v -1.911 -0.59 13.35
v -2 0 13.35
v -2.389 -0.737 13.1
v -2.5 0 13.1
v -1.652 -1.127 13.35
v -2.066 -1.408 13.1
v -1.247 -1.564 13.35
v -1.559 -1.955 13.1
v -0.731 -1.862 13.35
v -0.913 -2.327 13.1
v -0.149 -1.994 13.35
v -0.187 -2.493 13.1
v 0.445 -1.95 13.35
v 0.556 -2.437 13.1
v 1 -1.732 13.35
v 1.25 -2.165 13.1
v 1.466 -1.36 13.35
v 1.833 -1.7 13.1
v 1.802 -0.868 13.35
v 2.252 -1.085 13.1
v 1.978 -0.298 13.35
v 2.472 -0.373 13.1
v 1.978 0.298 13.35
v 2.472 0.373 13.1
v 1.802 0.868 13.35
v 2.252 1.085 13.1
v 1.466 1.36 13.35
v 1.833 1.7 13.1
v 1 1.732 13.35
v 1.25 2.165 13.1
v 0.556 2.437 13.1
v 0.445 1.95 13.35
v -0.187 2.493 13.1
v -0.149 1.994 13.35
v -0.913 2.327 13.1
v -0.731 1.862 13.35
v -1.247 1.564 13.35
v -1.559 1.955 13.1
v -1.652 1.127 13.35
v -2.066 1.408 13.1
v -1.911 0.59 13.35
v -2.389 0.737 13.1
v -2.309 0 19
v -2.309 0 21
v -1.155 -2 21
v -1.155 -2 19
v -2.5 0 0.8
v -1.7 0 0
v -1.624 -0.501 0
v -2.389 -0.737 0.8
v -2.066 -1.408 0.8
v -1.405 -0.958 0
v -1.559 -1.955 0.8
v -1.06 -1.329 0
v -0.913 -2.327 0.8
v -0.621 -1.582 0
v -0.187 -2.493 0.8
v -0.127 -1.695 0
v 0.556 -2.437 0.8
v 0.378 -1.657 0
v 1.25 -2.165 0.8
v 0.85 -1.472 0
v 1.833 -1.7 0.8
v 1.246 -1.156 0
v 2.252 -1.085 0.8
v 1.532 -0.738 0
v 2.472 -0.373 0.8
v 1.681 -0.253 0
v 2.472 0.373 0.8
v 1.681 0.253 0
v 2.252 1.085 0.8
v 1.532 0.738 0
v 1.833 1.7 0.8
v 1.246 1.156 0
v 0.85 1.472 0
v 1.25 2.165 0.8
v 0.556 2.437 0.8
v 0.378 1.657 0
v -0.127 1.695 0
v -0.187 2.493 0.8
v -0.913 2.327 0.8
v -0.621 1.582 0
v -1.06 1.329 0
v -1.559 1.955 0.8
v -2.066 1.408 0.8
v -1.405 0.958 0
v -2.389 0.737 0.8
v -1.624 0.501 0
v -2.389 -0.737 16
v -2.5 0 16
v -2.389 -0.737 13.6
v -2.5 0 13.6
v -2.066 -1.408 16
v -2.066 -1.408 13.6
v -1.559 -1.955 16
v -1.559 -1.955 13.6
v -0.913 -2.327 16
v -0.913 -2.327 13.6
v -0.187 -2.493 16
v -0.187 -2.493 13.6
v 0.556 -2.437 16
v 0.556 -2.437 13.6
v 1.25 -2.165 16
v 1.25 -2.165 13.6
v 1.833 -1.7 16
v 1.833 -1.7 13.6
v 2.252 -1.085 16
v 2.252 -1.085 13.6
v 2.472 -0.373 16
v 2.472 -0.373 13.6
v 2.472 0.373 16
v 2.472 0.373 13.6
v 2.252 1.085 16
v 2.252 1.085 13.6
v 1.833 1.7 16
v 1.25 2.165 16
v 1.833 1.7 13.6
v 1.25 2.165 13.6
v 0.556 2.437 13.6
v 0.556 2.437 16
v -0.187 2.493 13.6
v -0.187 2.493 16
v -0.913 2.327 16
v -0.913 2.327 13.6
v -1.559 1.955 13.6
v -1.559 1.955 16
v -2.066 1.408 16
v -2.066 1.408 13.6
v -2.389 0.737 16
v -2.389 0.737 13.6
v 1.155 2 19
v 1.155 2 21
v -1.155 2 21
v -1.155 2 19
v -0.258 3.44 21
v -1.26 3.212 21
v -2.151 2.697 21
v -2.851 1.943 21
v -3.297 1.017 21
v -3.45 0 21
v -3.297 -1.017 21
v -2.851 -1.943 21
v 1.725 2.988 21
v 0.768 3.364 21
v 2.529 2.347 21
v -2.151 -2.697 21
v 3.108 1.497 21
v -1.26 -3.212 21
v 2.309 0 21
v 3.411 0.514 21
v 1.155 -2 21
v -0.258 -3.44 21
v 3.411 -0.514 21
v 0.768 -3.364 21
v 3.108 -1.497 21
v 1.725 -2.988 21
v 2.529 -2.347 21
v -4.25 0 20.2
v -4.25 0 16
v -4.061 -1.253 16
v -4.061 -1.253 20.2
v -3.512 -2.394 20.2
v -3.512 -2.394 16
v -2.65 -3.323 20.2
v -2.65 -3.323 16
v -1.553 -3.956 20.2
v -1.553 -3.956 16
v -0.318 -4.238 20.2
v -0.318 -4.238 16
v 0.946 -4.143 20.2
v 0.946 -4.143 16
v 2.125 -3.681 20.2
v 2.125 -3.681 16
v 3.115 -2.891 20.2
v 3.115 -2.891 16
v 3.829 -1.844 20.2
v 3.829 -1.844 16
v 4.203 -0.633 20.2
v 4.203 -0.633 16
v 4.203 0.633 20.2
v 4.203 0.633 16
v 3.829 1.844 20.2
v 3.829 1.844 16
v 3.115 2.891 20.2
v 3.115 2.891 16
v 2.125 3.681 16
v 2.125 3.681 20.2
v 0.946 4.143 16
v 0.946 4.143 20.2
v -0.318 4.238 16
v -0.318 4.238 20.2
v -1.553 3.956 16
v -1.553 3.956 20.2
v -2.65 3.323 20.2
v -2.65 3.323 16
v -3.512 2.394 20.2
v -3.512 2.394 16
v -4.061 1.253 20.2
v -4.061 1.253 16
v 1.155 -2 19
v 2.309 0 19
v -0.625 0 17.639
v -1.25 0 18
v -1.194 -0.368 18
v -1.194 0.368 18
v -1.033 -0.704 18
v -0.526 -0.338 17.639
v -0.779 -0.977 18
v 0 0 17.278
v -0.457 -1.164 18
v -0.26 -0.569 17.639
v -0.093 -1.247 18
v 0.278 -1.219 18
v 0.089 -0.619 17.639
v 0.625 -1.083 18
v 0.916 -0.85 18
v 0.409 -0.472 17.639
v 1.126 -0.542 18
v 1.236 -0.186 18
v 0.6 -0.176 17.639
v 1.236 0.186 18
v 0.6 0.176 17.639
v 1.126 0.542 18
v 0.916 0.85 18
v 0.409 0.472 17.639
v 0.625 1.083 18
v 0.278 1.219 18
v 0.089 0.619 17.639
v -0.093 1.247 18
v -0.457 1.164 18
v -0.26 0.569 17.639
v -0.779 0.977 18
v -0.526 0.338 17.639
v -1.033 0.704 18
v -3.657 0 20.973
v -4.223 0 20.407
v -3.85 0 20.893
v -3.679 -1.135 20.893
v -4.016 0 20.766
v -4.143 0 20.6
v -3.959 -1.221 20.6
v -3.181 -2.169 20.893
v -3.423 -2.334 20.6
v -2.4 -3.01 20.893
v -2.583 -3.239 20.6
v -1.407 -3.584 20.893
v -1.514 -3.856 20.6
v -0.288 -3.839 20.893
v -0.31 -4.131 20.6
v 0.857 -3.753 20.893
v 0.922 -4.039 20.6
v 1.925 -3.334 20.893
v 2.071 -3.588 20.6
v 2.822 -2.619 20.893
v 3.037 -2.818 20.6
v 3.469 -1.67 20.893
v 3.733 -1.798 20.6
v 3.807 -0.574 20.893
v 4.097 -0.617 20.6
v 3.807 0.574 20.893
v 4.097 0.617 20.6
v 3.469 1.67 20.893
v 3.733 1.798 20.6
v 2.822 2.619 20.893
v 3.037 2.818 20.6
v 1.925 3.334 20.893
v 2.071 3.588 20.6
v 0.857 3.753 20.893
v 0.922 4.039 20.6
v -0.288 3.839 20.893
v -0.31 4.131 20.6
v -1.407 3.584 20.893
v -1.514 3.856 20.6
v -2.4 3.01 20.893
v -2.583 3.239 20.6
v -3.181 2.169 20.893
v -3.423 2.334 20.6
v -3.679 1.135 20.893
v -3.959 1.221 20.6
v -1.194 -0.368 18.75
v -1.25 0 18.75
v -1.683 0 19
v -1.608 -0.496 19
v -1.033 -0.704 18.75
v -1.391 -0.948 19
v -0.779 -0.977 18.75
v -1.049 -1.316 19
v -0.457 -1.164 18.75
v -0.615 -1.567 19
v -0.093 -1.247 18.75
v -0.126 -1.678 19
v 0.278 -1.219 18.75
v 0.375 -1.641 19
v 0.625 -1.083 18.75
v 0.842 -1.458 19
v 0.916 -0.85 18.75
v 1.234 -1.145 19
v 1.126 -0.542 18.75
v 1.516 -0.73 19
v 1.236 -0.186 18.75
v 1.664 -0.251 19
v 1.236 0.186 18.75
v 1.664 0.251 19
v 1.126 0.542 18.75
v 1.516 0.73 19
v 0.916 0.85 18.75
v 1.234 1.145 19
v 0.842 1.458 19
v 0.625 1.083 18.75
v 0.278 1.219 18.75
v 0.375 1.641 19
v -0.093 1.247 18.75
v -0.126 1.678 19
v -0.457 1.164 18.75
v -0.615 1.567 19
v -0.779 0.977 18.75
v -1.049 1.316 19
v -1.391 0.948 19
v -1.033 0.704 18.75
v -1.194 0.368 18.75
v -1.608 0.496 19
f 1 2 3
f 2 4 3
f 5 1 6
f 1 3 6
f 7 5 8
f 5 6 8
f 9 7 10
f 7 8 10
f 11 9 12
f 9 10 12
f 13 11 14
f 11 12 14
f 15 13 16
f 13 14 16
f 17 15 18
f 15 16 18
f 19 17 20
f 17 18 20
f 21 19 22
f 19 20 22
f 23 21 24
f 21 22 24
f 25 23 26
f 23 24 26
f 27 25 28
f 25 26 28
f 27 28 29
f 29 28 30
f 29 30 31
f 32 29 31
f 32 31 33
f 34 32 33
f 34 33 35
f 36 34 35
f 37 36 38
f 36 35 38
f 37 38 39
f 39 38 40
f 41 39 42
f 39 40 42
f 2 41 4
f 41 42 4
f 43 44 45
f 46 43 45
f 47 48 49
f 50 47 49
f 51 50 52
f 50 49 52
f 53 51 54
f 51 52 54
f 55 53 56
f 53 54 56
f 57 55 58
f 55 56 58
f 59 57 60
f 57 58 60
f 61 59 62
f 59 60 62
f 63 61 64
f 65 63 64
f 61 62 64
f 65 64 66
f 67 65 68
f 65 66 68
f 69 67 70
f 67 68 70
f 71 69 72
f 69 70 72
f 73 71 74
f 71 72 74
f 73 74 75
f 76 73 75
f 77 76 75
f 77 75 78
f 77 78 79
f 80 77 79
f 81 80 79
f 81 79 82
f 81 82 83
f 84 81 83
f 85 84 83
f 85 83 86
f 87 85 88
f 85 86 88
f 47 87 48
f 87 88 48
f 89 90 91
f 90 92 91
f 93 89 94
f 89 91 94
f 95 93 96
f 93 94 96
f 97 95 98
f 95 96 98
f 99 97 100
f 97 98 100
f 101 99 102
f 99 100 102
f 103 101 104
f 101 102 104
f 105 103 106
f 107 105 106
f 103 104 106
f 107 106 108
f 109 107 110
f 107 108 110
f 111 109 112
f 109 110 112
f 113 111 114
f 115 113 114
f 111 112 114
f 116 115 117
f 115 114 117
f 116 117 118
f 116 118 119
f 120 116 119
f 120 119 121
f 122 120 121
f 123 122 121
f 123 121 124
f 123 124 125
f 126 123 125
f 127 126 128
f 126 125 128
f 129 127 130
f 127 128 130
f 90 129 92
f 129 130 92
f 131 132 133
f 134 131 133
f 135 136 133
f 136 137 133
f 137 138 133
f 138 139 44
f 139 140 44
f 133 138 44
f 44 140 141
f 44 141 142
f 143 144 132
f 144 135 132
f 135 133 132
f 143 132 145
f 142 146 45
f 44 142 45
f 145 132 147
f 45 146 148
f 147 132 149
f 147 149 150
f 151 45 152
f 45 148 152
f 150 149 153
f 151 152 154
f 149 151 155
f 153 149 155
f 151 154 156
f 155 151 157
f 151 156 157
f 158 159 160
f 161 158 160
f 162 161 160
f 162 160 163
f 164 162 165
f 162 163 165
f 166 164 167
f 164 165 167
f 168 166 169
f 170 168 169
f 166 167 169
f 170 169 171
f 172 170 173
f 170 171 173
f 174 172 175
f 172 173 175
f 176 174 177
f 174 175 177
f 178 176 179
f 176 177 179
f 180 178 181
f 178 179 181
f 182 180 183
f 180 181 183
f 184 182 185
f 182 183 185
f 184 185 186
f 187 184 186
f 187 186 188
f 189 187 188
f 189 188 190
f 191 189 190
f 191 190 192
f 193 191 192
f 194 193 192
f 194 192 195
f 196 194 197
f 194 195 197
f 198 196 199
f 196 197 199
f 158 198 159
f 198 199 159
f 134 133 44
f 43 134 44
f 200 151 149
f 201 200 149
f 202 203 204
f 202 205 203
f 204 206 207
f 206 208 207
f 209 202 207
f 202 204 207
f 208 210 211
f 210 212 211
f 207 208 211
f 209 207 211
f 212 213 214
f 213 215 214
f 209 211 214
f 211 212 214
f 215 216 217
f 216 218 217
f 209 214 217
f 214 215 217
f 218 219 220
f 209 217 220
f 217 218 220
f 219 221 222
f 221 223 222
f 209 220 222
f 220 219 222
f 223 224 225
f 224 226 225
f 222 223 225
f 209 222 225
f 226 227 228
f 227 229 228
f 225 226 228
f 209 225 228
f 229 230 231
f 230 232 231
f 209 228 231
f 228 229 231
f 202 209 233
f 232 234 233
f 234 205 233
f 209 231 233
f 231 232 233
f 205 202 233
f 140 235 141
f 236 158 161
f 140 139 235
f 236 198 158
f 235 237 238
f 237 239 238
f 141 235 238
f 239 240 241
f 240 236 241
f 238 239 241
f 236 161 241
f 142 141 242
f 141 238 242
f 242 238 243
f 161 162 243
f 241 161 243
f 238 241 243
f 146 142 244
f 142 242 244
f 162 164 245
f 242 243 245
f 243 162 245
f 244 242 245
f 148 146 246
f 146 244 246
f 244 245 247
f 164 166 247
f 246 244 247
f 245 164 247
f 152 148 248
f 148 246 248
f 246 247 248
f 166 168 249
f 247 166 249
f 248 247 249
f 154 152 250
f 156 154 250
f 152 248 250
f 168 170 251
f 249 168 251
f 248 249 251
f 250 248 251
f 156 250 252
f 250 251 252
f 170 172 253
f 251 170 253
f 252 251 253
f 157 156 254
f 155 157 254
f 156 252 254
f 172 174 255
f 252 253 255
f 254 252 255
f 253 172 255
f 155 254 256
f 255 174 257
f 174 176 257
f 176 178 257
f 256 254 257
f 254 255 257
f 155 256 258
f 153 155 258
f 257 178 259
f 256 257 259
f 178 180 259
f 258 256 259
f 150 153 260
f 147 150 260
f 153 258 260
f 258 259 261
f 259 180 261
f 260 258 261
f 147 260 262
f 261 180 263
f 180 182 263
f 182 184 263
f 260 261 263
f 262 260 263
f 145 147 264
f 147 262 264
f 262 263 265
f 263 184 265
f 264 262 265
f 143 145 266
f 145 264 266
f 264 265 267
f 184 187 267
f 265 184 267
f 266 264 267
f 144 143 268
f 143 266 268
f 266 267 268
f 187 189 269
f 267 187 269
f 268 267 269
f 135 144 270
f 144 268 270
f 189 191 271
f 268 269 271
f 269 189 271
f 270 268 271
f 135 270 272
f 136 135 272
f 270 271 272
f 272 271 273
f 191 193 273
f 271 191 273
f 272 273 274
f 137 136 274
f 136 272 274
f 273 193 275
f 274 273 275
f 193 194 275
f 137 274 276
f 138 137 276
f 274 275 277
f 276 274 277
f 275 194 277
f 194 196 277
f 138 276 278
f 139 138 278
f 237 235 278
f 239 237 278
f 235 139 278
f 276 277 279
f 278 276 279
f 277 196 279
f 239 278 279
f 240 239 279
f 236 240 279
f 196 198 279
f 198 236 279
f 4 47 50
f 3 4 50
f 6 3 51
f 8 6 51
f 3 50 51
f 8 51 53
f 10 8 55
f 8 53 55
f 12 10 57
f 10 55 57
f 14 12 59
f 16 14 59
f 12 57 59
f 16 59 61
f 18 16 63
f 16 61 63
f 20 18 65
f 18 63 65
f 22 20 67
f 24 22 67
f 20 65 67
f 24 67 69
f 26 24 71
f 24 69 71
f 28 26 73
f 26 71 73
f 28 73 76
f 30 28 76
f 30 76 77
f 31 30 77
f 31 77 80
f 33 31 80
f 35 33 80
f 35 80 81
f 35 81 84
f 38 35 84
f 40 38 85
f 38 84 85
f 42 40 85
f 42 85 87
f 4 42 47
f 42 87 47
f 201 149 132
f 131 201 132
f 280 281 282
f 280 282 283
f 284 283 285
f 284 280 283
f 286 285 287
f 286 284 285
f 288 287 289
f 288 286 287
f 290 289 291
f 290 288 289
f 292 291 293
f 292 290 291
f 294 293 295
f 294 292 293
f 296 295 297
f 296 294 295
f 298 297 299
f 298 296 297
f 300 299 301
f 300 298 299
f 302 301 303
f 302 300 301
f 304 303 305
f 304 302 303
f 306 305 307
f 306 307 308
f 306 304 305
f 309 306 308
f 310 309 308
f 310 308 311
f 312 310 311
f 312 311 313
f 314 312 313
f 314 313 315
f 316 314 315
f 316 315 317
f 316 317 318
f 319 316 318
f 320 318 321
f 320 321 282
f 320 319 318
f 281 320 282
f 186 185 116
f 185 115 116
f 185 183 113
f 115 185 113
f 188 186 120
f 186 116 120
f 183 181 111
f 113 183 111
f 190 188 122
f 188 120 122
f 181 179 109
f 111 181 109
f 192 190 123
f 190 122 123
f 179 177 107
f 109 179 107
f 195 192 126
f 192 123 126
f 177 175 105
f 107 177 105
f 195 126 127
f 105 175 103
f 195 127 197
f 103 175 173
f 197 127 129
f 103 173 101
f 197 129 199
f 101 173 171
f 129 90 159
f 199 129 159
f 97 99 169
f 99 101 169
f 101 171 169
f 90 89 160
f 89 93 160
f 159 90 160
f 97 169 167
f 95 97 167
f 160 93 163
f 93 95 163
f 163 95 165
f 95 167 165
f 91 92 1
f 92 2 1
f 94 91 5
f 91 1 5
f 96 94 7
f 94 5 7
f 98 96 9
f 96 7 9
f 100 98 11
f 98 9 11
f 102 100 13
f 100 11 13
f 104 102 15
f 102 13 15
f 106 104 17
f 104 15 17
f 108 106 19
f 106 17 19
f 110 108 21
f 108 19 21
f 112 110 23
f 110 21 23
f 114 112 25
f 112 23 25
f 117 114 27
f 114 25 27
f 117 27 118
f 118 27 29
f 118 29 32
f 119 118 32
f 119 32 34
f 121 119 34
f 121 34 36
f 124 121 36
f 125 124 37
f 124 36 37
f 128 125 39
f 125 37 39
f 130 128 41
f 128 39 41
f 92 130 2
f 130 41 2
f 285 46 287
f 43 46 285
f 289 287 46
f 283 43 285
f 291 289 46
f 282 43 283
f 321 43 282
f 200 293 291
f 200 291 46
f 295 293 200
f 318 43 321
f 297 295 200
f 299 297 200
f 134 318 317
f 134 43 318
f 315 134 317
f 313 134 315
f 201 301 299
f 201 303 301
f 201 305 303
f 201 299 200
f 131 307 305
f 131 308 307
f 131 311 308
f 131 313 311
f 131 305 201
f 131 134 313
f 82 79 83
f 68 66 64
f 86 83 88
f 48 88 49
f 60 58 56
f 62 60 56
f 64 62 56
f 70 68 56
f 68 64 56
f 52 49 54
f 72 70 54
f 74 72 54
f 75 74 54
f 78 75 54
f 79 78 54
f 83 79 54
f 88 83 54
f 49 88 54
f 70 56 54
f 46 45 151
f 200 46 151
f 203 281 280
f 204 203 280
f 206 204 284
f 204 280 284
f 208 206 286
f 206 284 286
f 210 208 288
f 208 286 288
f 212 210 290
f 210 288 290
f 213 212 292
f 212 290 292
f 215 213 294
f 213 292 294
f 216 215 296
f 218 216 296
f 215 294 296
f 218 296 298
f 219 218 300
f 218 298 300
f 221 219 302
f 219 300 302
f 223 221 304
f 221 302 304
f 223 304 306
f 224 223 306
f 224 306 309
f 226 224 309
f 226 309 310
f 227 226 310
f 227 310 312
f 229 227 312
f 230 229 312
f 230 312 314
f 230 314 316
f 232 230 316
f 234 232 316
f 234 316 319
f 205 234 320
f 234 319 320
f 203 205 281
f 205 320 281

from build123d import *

# Parameters (mm, degrees)
F2_R     = 0.8
F3_SIZE  = 0.8
F5_DEPTH = 2
F6_SIZE2 = 0.25
F6_SIZE  = 0.4330127019


with BuildPart() as f1:
    # F0 (on Front) → F1 (revolve)
    with BuildSketch(Plane.XZ):
        Polygon((-2.5, 0), (0, 0), (0, 17.2783121635), (-1.25, 18), (-1.25, 21), (-4.25, 21), (-4.25, 16), (-2.5, 16), (-2.5, 13.6), (-2, 13.35), (-2.5, 13.1), align=None)
    revolve(axis=Axis((0, 0, 18.332445994), (0, 0, 1)))

    # F2
    f2_edges = [f1.edges().sort_by_distance(p)[0] for p in [
        (4.25, 0, 21),
    ]]
    fillet(f2_edges, radius=F2_R)

    # F3
    f3_edges = [f1.edges().sort_by_distance(p)[0] for p in [
        (2.5, 0, 0),
    ]]
    chamfer(f3_edges, length=F3_SIZE)

    # F4 (on face) → F5 (cut)
    with BuildSketch(Plane.XY.offset(21)):
        Polygon((-1.1547005384, -2), (1.1547005384, -2), (2.3094010768, 0), (1.1547005384, 2), (-1.1547005384, 2), (-2.3094010768, 0), align=None)
    extrude(amount=-F5_DEPTH, mode=Mode.SUBTRACT)

    # F6
    f6_edges = [f1.edges().sort_by_distance(p)[0] for p in [
        (1.25, 0, 19),
    ]]
    f6_side = f1.faces().sort_by_distance((-1.679136, -0.969449, 19))[0]
    chamfer(f6_edges, length=F6_SIZE, length2=F6_SIZE2, reference=f6_side)


solid = f1.part
